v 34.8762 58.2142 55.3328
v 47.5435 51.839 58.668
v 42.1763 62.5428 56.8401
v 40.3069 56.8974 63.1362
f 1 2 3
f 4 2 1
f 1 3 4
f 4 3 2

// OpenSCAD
// Auto-generated auxetic polyhedron
points = [
    [42.176271, 62.542773, 56.840072],
    [47.543452, 51.838998, 58.667975],
    [34.876189, 58.214168, 55.332800],
    [40.306887, 56.897419, 63.136197],
];

faces = [
    [0, 1, 2],
    [2, 1, 3],
    [3, 0, 2],
    [1, 0, 3],
];

polyhedron(points = points, faces = faces);
